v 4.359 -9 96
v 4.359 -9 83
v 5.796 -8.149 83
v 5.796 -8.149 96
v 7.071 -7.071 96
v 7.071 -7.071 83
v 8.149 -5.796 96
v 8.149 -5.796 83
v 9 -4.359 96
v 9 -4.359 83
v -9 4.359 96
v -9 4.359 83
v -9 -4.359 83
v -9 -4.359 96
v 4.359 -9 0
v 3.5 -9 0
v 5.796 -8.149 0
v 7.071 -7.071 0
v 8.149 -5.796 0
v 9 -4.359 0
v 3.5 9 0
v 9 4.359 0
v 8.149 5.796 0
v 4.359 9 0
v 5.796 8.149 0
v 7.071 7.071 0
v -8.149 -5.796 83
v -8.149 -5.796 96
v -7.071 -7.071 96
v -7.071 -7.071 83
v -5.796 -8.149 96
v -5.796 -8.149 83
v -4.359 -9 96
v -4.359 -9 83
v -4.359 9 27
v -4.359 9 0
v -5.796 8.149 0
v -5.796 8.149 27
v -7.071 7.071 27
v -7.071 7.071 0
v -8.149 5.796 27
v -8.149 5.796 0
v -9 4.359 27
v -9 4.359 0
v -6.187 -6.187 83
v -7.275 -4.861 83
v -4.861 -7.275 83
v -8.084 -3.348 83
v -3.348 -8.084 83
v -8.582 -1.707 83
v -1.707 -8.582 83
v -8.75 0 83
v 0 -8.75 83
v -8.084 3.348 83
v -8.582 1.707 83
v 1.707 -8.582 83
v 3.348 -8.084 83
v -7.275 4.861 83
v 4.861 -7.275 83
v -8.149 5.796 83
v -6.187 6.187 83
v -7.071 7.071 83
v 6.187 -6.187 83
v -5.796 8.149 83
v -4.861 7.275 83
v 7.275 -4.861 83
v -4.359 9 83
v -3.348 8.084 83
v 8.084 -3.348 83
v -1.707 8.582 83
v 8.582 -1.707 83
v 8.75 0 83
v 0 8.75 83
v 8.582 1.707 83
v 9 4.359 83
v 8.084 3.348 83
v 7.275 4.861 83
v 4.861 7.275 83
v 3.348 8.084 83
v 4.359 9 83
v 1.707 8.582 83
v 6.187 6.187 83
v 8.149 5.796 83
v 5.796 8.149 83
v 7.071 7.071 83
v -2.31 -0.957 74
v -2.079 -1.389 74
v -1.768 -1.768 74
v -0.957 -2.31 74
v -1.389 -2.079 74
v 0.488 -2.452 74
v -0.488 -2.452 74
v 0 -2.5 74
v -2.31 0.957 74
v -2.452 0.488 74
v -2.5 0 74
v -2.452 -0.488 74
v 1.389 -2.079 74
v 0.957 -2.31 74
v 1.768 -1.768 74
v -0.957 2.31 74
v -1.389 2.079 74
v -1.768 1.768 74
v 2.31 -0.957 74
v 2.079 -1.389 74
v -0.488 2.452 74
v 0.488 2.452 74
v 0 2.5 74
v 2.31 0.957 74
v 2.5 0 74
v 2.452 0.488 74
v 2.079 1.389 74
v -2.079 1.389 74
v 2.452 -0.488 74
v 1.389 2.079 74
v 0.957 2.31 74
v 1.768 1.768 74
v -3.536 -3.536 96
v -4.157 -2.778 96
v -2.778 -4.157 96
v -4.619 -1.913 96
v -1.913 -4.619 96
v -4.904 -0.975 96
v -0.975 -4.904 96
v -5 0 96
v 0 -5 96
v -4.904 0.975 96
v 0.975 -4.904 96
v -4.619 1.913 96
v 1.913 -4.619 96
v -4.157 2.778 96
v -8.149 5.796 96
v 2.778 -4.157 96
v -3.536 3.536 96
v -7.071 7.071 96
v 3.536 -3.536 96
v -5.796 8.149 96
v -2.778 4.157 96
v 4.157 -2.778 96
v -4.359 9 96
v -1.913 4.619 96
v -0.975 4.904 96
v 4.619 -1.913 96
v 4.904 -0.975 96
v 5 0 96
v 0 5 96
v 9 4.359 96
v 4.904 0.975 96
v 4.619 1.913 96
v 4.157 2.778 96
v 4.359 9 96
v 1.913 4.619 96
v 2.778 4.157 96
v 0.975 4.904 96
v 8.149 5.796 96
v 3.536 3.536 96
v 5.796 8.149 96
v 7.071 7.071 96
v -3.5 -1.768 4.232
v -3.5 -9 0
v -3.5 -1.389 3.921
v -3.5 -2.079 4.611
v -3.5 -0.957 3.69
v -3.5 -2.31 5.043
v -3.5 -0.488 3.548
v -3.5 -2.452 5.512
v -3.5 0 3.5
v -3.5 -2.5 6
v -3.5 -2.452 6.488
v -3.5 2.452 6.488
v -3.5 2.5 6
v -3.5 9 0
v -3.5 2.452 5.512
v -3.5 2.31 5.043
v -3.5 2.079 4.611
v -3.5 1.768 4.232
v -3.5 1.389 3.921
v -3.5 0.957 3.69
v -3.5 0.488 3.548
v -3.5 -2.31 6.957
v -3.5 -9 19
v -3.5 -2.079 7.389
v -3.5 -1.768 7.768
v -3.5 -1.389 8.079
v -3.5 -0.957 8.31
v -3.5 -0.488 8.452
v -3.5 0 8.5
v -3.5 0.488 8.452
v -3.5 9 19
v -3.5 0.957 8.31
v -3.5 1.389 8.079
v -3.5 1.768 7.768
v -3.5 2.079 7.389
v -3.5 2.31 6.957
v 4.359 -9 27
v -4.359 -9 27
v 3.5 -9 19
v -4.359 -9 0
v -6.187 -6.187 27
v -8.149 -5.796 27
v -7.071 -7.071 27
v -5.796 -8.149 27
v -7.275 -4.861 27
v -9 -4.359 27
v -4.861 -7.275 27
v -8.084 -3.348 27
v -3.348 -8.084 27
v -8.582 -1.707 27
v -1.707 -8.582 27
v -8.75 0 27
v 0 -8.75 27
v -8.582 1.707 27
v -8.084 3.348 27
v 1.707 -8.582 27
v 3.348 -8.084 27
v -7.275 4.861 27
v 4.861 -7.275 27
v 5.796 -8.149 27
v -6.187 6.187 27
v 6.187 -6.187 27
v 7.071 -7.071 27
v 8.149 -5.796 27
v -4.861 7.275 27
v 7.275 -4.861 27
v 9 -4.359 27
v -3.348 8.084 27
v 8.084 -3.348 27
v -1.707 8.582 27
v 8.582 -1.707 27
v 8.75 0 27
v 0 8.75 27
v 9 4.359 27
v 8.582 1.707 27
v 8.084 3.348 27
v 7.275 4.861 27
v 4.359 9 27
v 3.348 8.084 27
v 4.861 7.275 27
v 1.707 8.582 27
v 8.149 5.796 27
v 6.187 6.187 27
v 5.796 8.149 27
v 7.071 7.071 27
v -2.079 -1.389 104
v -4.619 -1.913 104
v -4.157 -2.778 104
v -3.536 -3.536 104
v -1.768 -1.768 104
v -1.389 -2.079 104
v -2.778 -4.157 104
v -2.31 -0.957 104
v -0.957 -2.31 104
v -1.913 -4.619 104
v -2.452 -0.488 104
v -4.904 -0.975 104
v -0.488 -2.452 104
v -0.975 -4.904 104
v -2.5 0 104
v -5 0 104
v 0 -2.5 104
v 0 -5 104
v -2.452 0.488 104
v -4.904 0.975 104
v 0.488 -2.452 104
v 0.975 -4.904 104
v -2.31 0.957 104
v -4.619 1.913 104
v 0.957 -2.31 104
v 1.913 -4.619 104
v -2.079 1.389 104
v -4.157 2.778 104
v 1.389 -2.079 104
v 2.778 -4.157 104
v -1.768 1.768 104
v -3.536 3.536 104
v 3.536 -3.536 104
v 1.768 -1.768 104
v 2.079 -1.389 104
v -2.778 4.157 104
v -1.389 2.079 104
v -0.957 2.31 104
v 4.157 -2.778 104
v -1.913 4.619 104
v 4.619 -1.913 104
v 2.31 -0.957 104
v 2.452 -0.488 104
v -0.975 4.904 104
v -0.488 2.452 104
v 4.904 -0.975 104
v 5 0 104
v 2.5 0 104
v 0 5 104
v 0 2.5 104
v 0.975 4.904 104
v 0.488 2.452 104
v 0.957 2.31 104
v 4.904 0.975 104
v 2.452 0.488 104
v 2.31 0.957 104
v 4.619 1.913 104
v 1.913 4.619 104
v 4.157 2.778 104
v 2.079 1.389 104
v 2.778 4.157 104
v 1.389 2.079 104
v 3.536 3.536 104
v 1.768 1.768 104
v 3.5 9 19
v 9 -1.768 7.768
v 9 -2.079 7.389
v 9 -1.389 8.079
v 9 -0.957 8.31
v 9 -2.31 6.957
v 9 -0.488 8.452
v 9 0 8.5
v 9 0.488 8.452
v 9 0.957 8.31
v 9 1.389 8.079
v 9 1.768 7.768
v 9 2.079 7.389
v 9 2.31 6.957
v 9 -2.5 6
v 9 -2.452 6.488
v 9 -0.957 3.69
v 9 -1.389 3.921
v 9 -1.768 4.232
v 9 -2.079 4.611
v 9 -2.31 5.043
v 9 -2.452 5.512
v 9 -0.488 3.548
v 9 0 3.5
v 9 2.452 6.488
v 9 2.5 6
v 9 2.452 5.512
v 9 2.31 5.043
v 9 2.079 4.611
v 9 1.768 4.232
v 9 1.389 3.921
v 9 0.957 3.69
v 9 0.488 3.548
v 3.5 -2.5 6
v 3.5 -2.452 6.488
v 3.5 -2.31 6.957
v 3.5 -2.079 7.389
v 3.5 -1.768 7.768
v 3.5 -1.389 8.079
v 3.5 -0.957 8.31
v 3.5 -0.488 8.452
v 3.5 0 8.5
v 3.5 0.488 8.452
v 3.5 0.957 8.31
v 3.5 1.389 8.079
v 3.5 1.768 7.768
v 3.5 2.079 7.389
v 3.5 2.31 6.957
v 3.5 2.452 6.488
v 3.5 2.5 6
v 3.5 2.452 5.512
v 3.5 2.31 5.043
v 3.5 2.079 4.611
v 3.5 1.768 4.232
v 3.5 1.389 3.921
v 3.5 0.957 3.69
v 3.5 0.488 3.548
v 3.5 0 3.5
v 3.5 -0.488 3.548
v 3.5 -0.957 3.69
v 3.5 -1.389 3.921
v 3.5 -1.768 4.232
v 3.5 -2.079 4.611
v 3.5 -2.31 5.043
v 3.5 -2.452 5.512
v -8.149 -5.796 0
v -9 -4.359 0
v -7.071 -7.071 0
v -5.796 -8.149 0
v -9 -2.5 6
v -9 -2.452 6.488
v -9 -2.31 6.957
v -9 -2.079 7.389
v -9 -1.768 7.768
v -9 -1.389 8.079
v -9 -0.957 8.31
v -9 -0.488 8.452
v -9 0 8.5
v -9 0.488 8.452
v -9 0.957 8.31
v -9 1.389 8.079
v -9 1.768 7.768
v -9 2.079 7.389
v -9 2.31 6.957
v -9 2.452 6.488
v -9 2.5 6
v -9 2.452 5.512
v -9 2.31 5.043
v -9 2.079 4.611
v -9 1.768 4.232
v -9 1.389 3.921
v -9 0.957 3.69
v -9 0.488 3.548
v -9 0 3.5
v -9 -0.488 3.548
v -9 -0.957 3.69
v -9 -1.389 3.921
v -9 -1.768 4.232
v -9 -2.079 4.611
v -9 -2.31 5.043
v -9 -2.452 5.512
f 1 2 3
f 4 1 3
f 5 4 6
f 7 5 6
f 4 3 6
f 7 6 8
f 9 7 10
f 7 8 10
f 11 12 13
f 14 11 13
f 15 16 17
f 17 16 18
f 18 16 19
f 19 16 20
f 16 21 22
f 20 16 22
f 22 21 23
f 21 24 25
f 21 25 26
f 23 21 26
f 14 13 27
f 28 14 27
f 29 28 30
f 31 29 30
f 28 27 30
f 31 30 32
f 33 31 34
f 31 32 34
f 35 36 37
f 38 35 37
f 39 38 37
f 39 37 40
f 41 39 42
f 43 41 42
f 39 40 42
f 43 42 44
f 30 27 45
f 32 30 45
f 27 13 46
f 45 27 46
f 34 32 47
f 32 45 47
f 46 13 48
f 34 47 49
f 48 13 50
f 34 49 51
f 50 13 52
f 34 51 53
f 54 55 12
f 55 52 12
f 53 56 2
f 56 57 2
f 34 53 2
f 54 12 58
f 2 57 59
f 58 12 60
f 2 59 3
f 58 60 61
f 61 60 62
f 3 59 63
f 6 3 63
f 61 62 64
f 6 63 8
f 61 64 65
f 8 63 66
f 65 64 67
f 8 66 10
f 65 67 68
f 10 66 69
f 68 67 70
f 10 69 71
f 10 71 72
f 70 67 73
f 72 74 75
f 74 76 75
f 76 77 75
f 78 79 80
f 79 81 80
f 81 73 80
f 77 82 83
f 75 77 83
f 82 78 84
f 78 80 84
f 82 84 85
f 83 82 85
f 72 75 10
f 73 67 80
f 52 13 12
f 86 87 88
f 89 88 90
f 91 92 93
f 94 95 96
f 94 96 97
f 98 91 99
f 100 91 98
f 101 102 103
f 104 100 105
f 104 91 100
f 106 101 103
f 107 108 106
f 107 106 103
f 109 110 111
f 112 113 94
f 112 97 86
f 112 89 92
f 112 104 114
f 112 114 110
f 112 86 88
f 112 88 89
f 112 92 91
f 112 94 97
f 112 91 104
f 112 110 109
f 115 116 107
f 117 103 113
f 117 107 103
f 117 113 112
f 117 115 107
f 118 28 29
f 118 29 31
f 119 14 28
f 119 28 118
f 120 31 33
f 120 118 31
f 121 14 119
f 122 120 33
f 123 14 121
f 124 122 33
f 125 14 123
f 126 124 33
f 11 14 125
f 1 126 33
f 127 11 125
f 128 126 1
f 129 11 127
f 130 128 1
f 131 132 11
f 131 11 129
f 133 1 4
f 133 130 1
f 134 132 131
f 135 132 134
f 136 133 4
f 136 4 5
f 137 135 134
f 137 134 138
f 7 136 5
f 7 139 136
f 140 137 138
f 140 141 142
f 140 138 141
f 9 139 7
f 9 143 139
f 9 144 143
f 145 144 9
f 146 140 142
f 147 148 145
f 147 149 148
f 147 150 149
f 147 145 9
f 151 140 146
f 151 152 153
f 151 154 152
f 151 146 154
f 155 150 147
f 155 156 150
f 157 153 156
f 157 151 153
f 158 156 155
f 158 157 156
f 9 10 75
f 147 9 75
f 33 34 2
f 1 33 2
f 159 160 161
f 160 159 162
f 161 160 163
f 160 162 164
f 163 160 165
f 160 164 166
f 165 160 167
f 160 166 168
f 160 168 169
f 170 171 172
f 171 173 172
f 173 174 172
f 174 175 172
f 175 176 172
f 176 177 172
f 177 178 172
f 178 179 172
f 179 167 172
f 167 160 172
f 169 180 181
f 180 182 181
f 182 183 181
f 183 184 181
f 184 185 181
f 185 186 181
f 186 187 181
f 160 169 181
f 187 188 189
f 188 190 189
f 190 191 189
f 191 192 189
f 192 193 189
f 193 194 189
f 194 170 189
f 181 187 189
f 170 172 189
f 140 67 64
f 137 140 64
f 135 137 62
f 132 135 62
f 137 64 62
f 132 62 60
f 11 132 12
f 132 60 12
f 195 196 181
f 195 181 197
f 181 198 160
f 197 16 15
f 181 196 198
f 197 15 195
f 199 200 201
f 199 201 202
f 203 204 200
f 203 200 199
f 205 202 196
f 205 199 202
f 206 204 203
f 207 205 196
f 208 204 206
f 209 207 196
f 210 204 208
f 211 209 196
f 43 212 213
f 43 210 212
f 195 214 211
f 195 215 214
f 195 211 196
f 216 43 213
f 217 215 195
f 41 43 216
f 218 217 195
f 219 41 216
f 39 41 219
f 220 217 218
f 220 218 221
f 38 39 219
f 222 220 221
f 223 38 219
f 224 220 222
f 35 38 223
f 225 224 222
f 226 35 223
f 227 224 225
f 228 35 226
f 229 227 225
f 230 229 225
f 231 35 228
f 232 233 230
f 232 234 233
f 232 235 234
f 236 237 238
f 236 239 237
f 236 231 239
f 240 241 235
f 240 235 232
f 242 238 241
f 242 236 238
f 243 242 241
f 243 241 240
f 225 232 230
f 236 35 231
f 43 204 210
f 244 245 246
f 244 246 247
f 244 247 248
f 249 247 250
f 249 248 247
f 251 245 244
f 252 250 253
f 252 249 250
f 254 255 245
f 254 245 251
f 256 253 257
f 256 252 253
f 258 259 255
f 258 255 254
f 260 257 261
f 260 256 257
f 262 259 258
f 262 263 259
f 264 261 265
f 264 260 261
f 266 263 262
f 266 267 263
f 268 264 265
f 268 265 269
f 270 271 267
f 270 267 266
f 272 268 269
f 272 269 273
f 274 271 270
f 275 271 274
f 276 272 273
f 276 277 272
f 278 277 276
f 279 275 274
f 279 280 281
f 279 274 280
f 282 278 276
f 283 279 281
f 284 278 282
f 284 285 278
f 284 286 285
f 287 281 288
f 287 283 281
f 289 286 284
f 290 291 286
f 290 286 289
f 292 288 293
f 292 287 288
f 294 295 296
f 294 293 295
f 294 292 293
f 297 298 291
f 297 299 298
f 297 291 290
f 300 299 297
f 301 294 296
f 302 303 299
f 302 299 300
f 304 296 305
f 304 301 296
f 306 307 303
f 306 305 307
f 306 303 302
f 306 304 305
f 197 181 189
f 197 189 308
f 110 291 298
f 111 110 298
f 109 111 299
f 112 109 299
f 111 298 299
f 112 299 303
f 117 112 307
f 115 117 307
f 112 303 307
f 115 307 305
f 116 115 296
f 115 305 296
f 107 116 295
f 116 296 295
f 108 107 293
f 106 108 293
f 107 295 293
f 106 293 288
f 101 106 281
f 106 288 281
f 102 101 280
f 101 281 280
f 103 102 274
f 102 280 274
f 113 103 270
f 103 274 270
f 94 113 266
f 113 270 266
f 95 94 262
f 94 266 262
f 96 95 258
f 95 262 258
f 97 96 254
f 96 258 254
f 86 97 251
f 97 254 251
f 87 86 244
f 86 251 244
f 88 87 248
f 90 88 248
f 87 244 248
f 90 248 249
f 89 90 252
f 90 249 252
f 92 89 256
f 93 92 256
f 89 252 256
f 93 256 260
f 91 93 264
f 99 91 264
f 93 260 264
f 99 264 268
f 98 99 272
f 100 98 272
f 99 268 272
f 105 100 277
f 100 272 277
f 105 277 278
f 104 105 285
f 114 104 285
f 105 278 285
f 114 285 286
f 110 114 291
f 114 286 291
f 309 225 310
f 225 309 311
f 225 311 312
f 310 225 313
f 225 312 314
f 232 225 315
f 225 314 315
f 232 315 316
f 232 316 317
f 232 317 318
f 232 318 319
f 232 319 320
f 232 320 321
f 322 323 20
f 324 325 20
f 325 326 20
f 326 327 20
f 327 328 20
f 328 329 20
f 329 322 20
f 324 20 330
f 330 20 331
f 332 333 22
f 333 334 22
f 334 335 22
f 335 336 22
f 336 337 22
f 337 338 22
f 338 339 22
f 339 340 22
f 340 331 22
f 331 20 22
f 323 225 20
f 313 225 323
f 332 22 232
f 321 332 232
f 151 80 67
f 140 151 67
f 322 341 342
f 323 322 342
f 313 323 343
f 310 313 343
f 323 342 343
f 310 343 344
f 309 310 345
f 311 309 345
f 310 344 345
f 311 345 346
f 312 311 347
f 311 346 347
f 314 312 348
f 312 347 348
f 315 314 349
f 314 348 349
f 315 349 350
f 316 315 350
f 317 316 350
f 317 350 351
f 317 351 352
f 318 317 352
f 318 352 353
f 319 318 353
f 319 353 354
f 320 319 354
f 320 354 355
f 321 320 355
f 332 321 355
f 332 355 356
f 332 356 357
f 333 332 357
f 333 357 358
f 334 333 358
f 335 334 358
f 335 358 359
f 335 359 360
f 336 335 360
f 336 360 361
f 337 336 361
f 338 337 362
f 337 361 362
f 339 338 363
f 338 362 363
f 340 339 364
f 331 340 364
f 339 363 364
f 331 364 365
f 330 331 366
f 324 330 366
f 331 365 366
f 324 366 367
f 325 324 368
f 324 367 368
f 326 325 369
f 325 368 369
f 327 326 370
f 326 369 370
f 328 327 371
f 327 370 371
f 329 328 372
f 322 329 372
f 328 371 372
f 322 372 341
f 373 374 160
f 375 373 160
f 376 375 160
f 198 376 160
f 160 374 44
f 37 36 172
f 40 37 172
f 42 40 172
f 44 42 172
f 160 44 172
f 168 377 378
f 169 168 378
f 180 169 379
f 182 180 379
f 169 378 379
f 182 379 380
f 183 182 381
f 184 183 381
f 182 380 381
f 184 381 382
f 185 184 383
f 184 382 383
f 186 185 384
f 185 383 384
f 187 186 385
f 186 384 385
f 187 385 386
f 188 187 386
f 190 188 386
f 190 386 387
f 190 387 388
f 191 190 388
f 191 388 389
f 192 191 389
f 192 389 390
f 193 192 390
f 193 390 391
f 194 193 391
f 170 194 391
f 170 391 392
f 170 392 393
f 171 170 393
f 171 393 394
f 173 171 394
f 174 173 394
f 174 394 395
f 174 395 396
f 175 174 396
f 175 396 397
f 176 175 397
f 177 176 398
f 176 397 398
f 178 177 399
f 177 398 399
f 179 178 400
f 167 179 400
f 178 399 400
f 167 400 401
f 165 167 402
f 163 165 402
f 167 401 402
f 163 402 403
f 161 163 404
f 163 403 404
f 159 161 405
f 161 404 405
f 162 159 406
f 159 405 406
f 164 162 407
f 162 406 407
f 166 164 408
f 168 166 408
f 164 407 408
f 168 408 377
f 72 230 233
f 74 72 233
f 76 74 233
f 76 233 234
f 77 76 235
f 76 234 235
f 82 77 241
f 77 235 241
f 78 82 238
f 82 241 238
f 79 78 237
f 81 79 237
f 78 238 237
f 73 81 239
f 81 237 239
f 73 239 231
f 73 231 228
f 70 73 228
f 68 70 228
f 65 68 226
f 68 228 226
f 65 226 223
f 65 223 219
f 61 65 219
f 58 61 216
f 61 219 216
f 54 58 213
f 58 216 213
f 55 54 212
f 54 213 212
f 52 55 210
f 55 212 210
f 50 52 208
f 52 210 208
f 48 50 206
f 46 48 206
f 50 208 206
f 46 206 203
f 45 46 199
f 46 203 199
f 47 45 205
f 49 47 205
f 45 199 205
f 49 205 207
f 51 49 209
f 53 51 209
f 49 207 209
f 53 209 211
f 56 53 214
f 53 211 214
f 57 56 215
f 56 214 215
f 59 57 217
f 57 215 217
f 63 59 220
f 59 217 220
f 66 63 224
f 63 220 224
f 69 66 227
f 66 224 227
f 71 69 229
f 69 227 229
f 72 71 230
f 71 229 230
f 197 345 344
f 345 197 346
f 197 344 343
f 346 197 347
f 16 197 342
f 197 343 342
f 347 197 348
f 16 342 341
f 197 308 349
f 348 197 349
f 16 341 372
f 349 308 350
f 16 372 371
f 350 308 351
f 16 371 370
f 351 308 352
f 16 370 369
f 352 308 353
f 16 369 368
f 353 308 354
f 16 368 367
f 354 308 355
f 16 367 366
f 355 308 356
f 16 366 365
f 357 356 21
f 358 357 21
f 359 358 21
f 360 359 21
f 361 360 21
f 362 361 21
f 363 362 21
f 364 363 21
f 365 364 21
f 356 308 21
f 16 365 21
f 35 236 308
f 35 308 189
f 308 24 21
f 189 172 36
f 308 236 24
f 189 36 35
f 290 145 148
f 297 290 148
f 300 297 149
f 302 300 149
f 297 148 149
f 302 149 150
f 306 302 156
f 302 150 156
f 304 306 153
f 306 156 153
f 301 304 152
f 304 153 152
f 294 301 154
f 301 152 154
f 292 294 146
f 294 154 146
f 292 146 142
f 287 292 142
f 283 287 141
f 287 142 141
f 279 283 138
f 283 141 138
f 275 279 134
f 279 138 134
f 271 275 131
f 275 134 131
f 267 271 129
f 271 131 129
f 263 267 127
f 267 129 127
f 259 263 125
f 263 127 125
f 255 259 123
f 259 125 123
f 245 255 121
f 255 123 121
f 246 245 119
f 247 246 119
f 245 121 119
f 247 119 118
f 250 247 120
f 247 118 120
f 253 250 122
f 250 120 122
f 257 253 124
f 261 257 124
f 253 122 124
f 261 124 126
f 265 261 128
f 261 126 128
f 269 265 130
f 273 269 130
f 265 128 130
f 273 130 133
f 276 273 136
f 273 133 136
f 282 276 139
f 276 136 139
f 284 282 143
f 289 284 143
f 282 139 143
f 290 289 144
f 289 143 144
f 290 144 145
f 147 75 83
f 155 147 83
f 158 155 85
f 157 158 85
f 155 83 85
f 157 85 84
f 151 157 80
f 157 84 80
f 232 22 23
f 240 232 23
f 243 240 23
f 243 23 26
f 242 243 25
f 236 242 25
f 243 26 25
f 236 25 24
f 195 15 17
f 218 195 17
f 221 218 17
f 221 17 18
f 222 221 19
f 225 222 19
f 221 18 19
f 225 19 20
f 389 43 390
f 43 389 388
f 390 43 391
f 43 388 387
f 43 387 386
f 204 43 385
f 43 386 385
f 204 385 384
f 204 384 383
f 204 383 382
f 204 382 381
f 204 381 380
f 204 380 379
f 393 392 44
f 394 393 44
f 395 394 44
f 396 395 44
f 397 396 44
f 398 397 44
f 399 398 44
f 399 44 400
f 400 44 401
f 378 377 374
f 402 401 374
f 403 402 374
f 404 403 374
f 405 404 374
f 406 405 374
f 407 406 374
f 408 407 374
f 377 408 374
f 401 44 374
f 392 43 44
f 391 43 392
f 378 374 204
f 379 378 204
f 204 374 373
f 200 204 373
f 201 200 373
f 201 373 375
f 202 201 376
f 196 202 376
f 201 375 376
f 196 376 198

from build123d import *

# Parameters (mm, degrees)
BOSS_EXTRUDE1_DEPTH = 27
SKETCH2_R           = 8.75
BOSS_EXTRUDE2_DEPTH = 56
SKETCH3_R           = 8.75
BOSS_EXTRUDE3_DEPTH = 13
SKETCH4_R           = 5
BOSS_EXTRUDE4_DEPTH = 8
SKETCH6_R           = 2.5
CUT_EXTRUDE1_DEPTH  = 30
CUT_EXTRUDE2_REACH  = 107.929
SKETCH8_R           = 2.5
CUT_EXTRUDE3_DEPTH  = 106.929221653


with BuildPart() as part:
    # Sketch1 → Boss-Extrude1 (new body)
    with BuildSketch(Plane.XY):
        with BuildLine():
            ThreePointArc((-9, -4.358898944), (-7.071067812, -7.071067812), (-4.358898944, -9))
            Line((-4.358898944, -9), (4.358898944, -9))
            ThreePointArc((4.358898944, -9), (7.071067812, -7.071067812), (9, -4.358898944))
            Line((9, -4.358898944), (9, 4.358898944))
            ThreePointArc((9, 4.358898944), (7.071067812, 7.071067812), (4.358898944, 9))
            Line((4.358898944, 9), (-4.358898944, 9))
            ThreePointArc((-4.358898944, 9), (-7.071067812, 7.071067812), (-9, 4.358898944))
            Line((-9, 4.358898944), (-9, -4.358898944))
        make_face()
    extrude(amount=BOSS_EXTRUDE1_DEPTH)

    # Sketch2 → Boss-Extrude2 (add)
    with BuildSketch(Plane.XY.offset(27)):
        Circle(SKETCH2_R)
    extrude(amount=BOSS_EXTRUDE2_DEPTH)

    # Sketch3 → Boss-Extrude3 (add)
    # profile 1 of 2: a face of its own
    with BuildSketch(Plane.XY.offset(83)):
        with BuildLine():
            ThreePointArc((-9, -4.358898944), (-7.071067812, -7.071067812), (-4.358898944, -9))
            Line((-4.358898944, -9), (4.358898944, -9))
            ThreePointArc((4.358898944, -9), (7.071067812, -7.071067812), (9, -4.358898944))
            Line((9, -4.358898944), (9, 4.358898944))
            ThreePointArc((9, 4.358898944), (7.071067812, 7.071067812), (4.358898944, 9))
            Line((4.358898944, 9), (-4.358898944, 9))
            ThreePointArc((-4.358898944, 9), (-7.071067812, 7.071067812), (-9, 4.358898944))
            Line((-9, 4.358898944), (-9, -4.358898944))
        make_face()
        Circle(SKETCH3_R, mode=Mode.SUBTRACT)
    # profile 2 of 2: a face of its own
    with BuildSketch(Plane.XY.offset(83)):
        Circle(SKETCH3_R)
    extrude(amount=BOSS_EXTRUDE3_DEPTH)

    # Sketch4 → Boss-Extrude4 (add)
    with BuildSketch(Plane.XY.offset(96)):
        Circle(SKETCH4_R)
    extrude(amount=BOSS_EXTRUDE4_DEPTH)

    # Sketch6 → Cut-Extrude1 (cut)
    with BuildSketch(Plane.XY.offset(104)):
        Circle(SKETCH6_R)
    extrude(amount=-CUT_EXTRUDE1_DEPTH, mode=Mode.SUBTRACT)

    # Sketch7 → Cut-Extrude2 (cut, up to next)
    with BuildSketch(Plane(origin=(0, 9, 0), x_dir=(1, 0, 0), z_dir=(0, 1, 0)), mode=Mode.PRIVATE) as cut_extrude2_sk1:
        Polygon((0, 0), (-3.5, 0), (-3.5, -19), (3.5, -19), (3.5, 0), align=None)
    cut_extrude2_tool1 = extrude(cut_extrude2_sk1.sketch, amount=-CUT_EXTRUDE2_REACH, mode=Mode.PRIVATE) & part.part
    add(cut_extrude2_tool1.solids().sort_by_distance((0, 9, 9.5))[0], mode=Mode.SUBTRACT)

    # Sketch8 → Cut-Extrude3 (cut, through all)
    with BuildSketch(Plane.ZY.offset(9)):
        with Locations(Location((6, 0, 0), (0, 0, 270))):
            Circle(SKETCH8_R)
    extrude(amount=-CUT_EXTRUDE3_DEPTH, mode=Mode.SUBTRACT)


solid = part.part
